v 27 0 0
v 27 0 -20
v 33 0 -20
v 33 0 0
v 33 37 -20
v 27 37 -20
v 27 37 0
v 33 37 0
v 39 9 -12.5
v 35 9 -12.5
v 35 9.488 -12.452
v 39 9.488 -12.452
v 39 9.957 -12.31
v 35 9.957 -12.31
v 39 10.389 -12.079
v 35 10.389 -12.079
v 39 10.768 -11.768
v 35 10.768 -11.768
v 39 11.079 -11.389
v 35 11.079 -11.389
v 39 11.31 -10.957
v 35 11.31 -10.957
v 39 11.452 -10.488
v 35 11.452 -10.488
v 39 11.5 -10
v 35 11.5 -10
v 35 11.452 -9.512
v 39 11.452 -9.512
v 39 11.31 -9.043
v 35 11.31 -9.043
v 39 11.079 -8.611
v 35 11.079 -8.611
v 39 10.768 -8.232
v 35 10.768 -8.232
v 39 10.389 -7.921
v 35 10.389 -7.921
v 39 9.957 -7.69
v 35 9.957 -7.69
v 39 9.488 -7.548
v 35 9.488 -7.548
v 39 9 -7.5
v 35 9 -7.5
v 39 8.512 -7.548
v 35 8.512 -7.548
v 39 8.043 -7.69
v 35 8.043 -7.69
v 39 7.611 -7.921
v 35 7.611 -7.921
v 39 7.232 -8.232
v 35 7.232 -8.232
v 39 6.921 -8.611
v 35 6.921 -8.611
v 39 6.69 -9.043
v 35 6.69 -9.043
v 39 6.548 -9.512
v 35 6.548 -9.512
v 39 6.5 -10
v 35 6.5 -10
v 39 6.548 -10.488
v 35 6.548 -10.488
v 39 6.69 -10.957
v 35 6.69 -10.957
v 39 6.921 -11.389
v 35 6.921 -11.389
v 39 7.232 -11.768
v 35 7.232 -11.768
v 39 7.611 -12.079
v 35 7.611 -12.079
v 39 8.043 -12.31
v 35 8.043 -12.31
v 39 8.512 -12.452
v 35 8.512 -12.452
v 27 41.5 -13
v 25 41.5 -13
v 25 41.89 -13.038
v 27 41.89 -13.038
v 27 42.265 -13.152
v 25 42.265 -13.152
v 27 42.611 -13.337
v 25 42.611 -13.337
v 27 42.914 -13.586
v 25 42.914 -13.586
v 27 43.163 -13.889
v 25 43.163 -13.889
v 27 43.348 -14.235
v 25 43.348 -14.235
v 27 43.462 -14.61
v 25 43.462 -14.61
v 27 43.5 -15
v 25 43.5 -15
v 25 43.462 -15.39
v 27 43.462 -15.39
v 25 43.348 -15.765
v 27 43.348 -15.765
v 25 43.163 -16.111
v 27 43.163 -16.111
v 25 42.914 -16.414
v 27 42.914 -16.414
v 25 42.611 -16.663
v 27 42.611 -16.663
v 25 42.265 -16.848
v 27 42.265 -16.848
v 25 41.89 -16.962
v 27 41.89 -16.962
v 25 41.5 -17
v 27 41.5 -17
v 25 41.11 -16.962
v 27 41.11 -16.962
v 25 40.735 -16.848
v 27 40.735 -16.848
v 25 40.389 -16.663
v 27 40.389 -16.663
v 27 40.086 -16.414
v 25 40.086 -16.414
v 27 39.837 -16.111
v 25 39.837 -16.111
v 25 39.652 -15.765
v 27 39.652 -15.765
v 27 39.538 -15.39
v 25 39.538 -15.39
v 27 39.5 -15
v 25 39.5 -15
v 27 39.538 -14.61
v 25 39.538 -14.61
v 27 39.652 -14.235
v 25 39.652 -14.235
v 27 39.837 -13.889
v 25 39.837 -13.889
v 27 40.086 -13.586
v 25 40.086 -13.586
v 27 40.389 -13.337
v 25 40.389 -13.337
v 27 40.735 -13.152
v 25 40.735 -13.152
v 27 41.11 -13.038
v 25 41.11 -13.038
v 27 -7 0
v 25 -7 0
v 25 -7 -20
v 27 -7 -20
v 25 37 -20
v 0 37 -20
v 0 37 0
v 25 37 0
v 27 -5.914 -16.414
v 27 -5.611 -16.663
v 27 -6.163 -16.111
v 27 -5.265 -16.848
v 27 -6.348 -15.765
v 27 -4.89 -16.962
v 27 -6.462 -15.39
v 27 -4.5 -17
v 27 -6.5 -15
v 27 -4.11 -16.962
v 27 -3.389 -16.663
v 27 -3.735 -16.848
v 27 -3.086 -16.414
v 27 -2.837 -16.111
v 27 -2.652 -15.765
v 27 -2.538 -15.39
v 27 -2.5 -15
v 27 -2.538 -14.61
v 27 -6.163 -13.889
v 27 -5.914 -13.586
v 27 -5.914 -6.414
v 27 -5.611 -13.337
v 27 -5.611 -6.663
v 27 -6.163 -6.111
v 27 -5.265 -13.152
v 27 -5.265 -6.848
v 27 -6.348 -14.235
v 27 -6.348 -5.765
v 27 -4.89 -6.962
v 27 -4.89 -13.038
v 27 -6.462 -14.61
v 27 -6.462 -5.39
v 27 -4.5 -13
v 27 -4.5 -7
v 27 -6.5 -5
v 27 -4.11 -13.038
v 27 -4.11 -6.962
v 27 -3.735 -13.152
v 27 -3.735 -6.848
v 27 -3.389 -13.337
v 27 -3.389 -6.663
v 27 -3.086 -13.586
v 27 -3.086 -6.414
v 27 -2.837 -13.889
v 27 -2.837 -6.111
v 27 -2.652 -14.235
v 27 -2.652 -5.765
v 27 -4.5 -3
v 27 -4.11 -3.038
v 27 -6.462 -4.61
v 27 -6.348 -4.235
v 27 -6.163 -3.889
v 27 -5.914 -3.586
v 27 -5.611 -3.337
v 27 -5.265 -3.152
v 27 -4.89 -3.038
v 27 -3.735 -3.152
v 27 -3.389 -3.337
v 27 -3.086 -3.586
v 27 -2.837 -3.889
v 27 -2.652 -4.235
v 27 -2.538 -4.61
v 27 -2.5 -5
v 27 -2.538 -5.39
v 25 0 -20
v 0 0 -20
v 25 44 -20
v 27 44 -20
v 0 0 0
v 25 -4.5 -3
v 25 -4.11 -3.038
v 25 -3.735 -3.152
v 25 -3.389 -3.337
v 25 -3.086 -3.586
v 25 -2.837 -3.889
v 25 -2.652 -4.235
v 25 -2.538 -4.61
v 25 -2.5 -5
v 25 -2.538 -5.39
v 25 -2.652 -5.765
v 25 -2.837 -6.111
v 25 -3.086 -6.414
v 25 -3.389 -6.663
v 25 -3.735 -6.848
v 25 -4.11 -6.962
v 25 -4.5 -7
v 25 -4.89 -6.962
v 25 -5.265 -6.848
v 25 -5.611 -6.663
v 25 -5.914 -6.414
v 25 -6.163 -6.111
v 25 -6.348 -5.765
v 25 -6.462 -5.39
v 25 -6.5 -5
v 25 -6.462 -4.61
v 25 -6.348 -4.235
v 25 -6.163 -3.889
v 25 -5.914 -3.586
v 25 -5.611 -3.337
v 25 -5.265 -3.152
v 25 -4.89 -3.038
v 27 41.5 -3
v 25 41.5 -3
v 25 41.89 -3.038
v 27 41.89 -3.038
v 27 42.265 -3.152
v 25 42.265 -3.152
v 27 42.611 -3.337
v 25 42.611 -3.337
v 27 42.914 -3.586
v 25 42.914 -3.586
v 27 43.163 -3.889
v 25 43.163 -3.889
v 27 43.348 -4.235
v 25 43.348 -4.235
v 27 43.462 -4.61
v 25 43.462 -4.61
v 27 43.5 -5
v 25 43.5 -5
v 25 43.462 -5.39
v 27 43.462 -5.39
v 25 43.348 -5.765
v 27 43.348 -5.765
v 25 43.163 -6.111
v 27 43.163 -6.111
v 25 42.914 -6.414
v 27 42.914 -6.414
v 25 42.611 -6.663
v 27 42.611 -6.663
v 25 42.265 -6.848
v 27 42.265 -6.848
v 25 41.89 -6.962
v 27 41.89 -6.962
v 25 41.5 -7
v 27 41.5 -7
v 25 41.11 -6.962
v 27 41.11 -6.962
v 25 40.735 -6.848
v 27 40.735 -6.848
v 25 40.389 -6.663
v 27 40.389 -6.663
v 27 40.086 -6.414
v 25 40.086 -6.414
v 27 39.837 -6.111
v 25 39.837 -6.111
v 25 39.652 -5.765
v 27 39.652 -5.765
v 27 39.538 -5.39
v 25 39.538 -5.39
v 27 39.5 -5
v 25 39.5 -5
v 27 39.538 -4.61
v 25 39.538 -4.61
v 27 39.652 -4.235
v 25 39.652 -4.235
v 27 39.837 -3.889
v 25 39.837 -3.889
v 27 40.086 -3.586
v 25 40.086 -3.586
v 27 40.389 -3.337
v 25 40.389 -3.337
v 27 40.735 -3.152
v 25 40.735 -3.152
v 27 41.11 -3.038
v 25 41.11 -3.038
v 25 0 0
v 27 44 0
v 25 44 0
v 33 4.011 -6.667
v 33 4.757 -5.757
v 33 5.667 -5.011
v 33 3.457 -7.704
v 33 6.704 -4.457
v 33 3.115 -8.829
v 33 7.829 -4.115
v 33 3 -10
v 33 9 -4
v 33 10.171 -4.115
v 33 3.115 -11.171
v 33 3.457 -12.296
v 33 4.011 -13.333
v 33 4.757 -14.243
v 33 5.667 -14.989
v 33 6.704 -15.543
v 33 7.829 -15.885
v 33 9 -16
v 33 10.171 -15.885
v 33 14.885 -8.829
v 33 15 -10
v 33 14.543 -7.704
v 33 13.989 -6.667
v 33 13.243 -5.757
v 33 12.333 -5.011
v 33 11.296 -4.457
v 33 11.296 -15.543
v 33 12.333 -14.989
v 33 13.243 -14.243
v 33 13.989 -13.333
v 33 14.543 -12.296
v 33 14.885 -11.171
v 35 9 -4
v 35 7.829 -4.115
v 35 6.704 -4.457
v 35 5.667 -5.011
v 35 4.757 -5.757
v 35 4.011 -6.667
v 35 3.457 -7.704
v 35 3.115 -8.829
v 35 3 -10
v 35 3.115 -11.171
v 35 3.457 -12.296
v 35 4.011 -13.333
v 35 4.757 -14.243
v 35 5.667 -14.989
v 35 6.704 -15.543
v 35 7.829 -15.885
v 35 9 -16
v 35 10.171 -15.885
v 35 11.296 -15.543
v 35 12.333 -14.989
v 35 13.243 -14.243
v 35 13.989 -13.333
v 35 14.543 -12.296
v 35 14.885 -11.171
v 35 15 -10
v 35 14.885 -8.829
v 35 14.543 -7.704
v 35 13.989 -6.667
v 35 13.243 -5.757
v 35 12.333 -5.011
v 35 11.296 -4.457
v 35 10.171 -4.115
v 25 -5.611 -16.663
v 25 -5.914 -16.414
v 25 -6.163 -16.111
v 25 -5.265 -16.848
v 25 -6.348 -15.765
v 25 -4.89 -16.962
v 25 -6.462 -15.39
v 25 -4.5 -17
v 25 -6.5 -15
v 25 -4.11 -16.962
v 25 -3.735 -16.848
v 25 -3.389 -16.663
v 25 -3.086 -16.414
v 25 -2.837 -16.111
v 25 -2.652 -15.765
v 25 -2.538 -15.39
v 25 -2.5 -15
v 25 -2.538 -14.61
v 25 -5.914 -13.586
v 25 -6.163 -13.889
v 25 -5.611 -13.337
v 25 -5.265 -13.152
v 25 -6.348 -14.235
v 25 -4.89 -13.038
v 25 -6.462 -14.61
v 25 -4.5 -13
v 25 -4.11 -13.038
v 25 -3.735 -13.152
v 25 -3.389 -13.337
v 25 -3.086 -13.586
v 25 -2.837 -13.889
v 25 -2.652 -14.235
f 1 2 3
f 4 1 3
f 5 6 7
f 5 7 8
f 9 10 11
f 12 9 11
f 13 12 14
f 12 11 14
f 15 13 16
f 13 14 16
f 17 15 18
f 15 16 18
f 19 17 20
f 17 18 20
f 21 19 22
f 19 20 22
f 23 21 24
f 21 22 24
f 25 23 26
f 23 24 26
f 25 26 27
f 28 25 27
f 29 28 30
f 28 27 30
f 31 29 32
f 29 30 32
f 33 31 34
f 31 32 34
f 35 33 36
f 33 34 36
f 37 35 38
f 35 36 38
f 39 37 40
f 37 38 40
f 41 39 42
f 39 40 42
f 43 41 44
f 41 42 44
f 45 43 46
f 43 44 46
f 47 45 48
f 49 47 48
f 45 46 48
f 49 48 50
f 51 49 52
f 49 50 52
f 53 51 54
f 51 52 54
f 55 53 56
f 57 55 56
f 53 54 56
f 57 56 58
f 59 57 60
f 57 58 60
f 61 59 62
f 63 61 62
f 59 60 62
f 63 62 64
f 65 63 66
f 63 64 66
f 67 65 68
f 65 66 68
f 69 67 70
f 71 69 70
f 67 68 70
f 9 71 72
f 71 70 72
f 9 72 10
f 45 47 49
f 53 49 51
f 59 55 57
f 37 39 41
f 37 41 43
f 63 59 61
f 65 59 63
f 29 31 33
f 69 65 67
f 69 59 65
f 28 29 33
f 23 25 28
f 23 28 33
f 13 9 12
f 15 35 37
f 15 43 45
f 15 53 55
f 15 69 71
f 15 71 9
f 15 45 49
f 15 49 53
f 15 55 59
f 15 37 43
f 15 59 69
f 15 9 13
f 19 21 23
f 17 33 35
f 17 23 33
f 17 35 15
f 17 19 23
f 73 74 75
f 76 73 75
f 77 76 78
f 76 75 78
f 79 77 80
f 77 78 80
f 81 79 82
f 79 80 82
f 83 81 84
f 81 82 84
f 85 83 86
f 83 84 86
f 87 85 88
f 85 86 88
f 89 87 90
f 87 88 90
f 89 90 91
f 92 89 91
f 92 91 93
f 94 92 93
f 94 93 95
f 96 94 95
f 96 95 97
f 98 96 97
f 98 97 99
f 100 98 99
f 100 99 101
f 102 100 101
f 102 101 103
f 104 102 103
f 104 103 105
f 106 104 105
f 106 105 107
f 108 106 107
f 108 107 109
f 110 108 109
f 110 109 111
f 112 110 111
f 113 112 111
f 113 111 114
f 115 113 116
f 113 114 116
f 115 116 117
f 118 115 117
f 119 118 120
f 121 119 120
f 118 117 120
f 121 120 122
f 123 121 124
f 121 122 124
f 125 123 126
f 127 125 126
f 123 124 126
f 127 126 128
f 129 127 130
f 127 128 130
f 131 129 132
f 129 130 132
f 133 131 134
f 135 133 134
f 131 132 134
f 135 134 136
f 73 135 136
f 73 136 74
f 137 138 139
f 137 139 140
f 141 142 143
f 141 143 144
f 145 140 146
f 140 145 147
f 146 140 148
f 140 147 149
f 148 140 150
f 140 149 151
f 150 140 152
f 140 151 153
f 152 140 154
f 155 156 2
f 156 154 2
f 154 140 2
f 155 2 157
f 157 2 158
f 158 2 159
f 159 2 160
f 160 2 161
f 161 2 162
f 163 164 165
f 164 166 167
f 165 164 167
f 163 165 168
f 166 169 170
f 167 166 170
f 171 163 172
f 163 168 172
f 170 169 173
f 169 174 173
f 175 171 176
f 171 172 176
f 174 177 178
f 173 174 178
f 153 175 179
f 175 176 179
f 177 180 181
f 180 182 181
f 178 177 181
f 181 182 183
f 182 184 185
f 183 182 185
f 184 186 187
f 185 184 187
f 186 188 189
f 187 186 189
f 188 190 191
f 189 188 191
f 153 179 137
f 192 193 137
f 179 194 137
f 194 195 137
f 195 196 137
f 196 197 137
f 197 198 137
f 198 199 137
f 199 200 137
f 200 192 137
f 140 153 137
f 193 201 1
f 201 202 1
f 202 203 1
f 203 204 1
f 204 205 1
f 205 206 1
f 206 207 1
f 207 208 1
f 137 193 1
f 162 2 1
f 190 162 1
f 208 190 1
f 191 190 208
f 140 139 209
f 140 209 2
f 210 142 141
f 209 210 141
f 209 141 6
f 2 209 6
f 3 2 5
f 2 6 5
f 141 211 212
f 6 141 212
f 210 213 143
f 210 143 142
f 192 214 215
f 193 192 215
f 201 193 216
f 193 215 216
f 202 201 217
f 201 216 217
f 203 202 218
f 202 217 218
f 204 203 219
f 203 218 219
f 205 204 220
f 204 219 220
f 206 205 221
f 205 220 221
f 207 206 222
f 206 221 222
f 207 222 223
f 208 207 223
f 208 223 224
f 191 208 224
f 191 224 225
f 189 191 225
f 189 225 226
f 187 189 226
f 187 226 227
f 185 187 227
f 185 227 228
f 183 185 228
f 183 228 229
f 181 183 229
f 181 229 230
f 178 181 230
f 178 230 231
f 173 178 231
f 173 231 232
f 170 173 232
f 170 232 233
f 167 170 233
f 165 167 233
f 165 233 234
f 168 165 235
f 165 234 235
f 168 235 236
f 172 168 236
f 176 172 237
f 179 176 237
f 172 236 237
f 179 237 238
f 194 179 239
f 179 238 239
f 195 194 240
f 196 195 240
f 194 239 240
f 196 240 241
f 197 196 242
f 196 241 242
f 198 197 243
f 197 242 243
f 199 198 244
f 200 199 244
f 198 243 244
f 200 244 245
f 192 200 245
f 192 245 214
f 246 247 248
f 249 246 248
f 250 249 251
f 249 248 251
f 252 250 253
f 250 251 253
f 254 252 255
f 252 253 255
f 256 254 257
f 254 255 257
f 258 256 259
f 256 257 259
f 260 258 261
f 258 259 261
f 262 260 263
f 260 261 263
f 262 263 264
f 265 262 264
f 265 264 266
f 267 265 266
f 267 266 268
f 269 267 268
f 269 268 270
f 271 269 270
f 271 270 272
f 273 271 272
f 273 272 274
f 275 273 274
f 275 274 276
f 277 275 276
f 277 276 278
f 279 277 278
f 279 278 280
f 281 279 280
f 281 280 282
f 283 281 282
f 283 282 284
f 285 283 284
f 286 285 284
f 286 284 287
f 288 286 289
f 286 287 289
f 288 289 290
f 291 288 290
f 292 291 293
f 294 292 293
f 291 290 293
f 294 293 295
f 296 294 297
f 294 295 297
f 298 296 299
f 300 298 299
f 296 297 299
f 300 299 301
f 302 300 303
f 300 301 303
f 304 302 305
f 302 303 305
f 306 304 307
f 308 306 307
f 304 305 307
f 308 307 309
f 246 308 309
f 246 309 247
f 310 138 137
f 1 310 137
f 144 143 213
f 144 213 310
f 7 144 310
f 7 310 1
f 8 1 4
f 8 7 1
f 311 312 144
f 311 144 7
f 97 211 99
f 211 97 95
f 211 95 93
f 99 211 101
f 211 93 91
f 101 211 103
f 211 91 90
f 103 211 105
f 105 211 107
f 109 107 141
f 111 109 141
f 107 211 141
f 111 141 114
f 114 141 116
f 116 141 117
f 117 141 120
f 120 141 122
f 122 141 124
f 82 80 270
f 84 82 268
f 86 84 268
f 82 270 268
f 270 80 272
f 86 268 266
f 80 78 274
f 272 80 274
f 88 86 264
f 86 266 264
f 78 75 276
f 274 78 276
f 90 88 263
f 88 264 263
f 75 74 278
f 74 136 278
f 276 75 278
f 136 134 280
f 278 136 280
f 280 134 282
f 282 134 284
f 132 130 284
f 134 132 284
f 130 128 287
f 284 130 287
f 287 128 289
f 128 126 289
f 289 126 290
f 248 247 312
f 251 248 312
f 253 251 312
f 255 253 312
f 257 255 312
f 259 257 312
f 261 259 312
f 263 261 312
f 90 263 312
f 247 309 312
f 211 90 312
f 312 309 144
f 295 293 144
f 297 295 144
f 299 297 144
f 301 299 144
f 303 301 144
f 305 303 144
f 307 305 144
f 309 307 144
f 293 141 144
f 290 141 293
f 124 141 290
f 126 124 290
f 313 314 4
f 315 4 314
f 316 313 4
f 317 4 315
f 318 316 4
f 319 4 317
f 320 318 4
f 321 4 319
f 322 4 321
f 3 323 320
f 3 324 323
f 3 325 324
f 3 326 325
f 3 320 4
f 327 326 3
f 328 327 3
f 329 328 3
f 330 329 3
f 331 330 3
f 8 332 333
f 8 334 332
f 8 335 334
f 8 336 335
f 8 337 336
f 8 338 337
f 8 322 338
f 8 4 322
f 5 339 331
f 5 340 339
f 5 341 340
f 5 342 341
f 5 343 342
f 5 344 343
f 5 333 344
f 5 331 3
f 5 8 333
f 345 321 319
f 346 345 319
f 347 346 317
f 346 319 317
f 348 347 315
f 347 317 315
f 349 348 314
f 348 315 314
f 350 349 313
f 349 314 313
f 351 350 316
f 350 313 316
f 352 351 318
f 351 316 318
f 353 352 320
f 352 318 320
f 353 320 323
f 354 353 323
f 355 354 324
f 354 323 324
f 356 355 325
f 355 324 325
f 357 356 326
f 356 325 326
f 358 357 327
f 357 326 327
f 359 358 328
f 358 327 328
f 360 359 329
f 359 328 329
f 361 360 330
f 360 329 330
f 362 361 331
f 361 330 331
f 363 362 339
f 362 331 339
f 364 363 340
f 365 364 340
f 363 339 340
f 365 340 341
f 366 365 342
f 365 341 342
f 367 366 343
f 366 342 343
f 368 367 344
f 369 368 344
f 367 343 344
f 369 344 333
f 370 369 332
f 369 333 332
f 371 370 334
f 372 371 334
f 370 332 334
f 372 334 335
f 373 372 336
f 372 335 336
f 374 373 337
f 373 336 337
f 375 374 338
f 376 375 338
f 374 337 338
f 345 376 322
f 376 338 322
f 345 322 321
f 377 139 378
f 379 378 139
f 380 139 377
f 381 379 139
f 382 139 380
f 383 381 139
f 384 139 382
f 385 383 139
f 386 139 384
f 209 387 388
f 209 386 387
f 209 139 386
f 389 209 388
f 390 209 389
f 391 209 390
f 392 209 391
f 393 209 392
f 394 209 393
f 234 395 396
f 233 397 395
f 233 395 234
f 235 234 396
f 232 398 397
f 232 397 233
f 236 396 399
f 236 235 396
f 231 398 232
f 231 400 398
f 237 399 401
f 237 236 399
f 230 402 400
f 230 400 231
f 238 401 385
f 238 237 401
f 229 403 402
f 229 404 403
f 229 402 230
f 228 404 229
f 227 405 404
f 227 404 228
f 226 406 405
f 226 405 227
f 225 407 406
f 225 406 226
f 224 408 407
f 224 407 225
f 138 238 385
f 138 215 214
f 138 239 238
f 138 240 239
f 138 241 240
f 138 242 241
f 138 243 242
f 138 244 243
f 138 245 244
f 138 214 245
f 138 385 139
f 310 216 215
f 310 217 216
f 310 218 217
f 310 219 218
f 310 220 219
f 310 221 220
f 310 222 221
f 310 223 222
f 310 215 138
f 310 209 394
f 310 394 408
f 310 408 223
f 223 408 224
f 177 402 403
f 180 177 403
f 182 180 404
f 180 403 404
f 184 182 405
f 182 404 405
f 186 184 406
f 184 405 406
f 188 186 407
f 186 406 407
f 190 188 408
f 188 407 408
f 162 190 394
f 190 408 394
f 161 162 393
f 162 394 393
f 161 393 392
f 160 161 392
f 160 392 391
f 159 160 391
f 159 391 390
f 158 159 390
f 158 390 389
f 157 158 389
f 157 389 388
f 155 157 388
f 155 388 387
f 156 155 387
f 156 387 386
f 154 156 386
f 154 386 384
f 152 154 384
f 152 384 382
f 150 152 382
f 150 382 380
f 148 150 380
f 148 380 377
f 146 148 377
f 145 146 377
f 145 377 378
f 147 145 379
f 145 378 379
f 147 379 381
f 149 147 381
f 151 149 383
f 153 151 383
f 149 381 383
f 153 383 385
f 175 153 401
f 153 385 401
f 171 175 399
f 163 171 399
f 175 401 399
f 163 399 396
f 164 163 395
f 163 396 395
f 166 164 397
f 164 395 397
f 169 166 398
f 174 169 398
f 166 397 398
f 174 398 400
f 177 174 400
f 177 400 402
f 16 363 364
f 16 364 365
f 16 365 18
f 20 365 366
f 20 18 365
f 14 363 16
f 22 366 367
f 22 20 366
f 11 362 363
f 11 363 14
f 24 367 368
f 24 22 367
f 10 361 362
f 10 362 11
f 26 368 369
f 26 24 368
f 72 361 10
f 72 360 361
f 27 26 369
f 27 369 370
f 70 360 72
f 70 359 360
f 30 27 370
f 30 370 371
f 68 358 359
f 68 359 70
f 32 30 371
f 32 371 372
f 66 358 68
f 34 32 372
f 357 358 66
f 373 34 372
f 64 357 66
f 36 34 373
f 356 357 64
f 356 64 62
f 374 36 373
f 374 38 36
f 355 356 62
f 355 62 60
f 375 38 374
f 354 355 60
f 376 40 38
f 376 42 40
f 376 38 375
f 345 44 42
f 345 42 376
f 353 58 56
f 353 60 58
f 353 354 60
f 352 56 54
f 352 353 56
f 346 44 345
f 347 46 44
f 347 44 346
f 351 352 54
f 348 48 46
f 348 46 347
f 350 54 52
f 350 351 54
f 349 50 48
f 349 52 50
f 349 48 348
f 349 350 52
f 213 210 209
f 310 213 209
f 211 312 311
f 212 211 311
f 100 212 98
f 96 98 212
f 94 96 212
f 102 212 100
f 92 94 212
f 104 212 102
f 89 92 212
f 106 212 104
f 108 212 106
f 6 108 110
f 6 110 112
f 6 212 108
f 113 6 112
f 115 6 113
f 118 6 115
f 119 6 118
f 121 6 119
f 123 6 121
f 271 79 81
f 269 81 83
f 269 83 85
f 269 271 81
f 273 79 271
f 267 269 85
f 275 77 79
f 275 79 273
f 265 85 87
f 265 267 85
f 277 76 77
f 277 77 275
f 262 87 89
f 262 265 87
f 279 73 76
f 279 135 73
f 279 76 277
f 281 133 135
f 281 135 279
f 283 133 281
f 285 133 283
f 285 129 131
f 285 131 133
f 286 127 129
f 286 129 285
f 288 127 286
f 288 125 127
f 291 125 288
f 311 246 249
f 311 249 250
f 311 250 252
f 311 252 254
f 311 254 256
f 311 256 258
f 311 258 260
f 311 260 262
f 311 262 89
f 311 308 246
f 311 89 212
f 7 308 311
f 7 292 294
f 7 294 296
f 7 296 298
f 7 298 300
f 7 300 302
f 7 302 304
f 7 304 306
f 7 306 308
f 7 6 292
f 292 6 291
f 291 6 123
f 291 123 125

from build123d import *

# Parameters (mm, degrees)
ESQUISSE2_W                   = 33
ESQUISSE2_H                   = 20
BOSS_EXTRU_1_DEPTH            = 18.5
ESQUISSE3_W                   = 2
ESQUISSE3_H                   = 20
BOSS_EXTRU_2_DEPTH            = 7
ESQUISSE4_R                   = 6
BOSS_EXTRU_3_DEPTH            = 2
ESQUISSE5_R                   = 2.5
BOSS_EXTRU_4_DEPTH            = 4
DIAM_TRE_DU_PER_AGE_4_0_4_1_D = 4


with BuildPart() as part:
    # Esquisse2 → Boss.-Extru.1 (new body)
    with BuildSketch(Plane(origin=(0, 0, 0), x_dir=(1, 0, 0), z_dir=(0, 1, 0))):
        with Locations((16.5, 10)):
            Rectangle(ESQUISSE2_W, ESQUISSE2_H)
    boss_extru_1 = extrude(amount=BOSS_EXTRU_1_DEPTH)

    # Esquisse3 → Boss.-Extru.2 (add)
    with BuildSketch(Plane.XZ):
        with Locations((26, -10)):
            Rectangle(ESQUISSE3_W, ESQUISSE3_H)
    boss_extru_2 = extrude(amount=BOSS_EXTRU_2_DEPTH)

    # Symétrie1: Boss.-Extru.1, Boss.-Extru.2 across plane
    add(boss_extru_1.mirror(Plane(origin=(0, 18.5, 0), x_dir=(0, 0, 1), z_dir=(0, -1, 0))))
    add(boss_extru_2.mirror(Plane(origin=(0, 18.5, 0), x_dir=(0, 0, 1), z_dir=(0, -1, 0))))

    # Esquisse4 → Boss.-Extru.3 (add)
    with BuildSketch(Plane(origin=(33, 0, 0), x_dir=(0, 0, -1), z_dir=(1, 0, 0))):
        with Locations(Location((10, 9, 0), (0, 0, 180))):
            Circle(ESQUISSE4_R)
    extrude(amount=BOSS_EXTRU_3_DEPTH)

    # Esquisse5 → Boss.-Extru.4 (add)
    with BuildSketch(Plane(origin=(35, 0, 0), x_dir=(0, 0, -1), z_dir=(1, 0, 0))):
        with Locations((10, 9)):
            Circle(ESQUISSE5_R)
    extrude(amount=BOSS_EXTRU_4_DEPTH)

    # Diamètre du perçage Ø4.0 (4)1 (through all)
    with Locations(Plane(origin=(27, 0, 0), x_dir=(0, 0, -1), z_dir=(1, 0, 0))):
        with Locations((15, 41.5), (5, 41.5), (15, -4.5), (5, -4.5)):
            Hole(DIAM_TRE_DU_PER_AGE_4_0_4_1_D / 2)


solid = part.part
